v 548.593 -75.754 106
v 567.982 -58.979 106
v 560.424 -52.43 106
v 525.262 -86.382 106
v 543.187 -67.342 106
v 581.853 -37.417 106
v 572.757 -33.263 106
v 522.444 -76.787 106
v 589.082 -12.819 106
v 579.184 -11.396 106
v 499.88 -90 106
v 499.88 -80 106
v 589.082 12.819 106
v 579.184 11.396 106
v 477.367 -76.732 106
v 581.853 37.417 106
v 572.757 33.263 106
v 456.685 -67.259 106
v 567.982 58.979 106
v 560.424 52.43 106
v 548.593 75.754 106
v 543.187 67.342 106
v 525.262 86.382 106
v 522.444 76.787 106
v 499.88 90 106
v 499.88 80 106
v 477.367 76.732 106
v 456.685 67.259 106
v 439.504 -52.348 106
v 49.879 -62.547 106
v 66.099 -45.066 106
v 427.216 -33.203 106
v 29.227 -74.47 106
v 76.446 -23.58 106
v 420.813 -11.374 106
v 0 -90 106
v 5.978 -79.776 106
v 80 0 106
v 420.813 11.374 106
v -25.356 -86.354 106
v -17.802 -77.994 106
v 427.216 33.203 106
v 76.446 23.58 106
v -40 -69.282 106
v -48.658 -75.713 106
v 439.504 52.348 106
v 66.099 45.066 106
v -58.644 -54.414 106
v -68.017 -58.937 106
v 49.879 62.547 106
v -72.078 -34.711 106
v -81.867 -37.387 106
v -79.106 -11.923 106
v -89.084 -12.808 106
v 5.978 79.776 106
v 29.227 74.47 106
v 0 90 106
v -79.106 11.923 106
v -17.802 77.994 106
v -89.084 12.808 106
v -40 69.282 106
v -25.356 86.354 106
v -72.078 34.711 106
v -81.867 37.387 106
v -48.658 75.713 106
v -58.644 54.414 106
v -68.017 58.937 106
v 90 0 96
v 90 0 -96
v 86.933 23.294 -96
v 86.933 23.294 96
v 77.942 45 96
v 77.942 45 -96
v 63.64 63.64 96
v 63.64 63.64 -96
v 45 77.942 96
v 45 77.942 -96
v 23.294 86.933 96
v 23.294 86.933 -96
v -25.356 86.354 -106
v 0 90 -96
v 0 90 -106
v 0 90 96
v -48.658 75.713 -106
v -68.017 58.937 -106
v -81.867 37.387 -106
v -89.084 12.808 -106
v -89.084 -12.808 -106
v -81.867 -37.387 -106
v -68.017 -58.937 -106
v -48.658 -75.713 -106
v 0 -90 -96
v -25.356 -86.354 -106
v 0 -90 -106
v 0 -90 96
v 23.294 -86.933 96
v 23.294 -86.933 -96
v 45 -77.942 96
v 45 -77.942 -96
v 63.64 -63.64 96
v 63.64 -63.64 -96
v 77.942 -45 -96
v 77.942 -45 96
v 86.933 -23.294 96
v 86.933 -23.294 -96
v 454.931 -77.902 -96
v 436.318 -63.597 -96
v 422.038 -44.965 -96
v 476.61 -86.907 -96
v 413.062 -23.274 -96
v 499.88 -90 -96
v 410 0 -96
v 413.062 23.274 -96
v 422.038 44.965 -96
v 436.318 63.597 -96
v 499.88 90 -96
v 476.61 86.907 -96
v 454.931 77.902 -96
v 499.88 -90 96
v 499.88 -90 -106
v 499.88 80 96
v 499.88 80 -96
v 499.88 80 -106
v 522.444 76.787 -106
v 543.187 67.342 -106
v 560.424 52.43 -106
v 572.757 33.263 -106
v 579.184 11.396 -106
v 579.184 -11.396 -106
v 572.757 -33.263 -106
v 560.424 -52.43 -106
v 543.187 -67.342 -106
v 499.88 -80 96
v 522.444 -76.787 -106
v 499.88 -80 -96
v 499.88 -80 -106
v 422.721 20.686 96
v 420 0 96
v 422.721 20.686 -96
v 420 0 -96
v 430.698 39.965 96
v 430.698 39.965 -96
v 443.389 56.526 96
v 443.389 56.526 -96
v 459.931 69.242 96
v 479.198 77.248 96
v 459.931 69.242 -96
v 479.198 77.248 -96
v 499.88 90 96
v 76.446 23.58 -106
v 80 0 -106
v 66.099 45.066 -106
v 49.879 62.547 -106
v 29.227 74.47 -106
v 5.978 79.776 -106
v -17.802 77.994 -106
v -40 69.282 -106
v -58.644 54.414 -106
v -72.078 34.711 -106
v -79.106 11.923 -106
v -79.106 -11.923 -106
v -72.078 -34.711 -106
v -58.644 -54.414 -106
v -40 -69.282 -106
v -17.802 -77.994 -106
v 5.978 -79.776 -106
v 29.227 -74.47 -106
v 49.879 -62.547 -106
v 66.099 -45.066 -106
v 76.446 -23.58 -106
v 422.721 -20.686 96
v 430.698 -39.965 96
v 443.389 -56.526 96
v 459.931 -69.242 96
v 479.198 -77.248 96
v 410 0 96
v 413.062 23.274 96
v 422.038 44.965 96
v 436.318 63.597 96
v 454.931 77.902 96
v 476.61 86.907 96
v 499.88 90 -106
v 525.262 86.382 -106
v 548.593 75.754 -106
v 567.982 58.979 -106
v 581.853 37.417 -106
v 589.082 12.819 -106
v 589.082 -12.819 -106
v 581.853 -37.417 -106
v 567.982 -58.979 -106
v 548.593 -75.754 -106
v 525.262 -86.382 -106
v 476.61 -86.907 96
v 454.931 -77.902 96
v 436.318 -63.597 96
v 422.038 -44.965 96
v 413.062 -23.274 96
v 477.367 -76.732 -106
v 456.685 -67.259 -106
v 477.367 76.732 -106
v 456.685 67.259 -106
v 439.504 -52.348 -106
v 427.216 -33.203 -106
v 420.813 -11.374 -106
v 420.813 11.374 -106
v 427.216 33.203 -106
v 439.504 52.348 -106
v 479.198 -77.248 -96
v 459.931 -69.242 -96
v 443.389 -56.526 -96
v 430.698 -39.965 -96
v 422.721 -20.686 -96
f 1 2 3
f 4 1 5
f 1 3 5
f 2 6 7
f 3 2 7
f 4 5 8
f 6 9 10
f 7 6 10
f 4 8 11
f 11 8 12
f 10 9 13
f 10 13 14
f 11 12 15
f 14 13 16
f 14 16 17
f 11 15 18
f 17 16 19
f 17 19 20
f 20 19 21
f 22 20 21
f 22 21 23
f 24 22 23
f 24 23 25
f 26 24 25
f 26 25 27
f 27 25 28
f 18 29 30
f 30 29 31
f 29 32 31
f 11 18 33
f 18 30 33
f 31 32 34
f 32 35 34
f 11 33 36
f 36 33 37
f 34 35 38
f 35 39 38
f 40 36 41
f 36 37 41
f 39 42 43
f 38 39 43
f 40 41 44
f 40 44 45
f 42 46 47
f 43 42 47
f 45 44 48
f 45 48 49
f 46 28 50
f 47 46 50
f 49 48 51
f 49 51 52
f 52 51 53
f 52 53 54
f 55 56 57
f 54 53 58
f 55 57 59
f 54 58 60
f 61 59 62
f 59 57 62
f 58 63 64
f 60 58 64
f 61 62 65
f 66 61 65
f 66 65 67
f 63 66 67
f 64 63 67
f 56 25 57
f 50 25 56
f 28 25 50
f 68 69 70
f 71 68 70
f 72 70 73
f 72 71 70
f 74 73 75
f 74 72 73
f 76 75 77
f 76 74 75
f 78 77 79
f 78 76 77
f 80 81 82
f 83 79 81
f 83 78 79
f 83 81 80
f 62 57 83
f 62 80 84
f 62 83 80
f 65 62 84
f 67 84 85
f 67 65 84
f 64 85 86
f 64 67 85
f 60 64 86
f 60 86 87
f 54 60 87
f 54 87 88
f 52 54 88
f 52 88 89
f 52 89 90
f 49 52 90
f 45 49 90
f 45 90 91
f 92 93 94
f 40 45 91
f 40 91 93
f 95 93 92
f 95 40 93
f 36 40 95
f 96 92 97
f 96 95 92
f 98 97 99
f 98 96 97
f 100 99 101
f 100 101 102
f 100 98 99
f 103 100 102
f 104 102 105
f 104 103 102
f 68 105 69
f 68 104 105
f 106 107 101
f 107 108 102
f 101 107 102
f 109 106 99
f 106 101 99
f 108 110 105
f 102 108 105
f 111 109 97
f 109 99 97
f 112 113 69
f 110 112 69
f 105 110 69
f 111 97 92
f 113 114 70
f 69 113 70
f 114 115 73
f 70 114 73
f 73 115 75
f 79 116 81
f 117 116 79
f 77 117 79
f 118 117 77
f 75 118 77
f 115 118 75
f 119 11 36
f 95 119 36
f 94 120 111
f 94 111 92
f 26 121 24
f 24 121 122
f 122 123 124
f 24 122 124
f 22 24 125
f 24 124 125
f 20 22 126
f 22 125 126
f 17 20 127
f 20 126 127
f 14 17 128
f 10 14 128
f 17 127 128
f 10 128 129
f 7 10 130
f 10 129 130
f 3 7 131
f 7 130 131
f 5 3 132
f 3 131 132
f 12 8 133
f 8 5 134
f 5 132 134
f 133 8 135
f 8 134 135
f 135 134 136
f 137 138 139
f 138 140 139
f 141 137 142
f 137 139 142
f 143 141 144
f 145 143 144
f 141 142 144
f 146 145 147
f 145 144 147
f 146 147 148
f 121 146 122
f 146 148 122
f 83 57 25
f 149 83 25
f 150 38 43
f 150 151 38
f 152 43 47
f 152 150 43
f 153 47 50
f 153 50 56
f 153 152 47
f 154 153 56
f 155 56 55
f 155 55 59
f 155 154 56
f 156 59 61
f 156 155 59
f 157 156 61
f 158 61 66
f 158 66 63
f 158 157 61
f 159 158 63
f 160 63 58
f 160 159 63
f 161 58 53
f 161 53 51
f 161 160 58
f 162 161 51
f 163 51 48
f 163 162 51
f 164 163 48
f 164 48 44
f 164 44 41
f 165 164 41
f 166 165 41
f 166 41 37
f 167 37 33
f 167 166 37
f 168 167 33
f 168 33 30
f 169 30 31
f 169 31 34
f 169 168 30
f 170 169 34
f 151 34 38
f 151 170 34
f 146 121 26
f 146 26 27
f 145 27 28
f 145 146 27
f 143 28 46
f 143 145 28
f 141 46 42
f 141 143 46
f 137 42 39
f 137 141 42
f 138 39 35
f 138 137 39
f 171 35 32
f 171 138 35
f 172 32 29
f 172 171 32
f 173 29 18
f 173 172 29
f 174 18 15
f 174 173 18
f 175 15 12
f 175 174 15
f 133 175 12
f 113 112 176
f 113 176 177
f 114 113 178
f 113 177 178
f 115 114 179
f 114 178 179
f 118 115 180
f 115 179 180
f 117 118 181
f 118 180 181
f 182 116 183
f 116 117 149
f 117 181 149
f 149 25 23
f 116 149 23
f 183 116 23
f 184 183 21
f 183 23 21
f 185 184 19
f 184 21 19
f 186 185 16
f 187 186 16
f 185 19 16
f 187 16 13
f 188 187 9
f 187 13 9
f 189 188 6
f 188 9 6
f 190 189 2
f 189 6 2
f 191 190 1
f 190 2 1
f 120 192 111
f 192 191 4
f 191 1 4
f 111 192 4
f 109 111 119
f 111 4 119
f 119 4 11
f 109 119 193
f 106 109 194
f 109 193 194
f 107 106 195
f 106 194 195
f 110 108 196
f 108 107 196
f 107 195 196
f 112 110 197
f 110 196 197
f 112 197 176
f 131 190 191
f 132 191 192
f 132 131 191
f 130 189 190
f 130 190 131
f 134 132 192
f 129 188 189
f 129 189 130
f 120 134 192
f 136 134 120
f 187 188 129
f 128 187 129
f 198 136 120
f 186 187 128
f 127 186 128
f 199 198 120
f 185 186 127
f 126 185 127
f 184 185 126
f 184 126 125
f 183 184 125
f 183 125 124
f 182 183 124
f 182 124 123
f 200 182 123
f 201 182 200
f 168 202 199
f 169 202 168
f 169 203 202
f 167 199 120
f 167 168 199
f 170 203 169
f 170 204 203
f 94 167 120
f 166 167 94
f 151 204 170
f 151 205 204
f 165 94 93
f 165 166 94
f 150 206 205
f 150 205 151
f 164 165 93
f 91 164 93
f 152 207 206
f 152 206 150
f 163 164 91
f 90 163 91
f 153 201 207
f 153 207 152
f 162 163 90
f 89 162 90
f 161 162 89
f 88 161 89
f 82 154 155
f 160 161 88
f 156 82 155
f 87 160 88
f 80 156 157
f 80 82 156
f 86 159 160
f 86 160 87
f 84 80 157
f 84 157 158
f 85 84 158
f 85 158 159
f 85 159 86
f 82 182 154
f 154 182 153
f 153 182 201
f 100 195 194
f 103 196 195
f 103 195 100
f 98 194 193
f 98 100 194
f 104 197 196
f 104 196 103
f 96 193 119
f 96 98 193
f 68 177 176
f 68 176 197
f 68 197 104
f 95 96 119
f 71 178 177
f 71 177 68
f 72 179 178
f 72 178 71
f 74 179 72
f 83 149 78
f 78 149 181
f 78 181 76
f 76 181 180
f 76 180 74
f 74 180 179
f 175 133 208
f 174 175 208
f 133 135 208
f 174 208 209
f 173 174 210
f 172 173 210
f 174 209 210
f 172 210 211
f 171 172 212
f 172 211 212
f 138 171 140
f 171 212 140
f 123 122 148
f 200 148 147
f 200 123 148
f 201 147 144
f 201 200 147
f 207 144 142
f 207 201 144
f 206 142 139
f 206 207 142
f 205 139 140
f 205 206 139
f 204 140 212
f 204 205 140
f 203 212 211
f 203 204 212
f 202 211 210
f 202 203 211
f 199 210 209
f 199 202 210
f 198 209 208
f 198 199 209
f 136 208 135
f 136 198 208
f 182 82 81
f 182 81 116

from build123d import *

# Parameters (mm, degrees)
SKETCH1_R               = 90
SKETCH1_R_2             = 80
BOSS_EXTRUDE1_DEPTH     = 106
BOSS_EXTRUDE2_DEPTH     = 10
CUT_EXTRUDE1_DEPTH      = 631.082534276
CUT_EXTRUDE1_DEPTH_BACK = 631.082534276


with BuildPart() as part:
    # Sketch1 → Boss-Extrude1 (new, symmetric)
    with BuildSketch(Plane.XY):
        Circle(SKETCH1_R)
        Circle(SKETCH1_R_2, mode=Mode.SUBTRACT)
    boss_extrude1 = extrude(amount=BOSS_EXTRUDE1_DEPTH, both=True)

    # Sketch2 → Boss-Extrude2 (add)
    with BuildSketch(Plane.XY.offset(106)):
        with BuildLine():
            Line((0, 90), (499.88, 90))
            Line((499.88, 90), (499.88, -90))
            Line((499.88, -90), (0, -90))
            ThreePointArc((0, -90), (90, 0), (0, 90))
        make_face()
    boss_extrude2 = extrude(amount=-BOSS_EXTRUDE2_DEPTH)

    # Mirror1: Boss-Extrude2 across plane
    add(boss_extrude2.mirror(Plane.XY))

    # Mirror2: Boss-Extrude1 across plane
    add(boss_extrude1.mirror(Plane(origin=(250, 0, 0), x_dir=(0, 0, 1), z_dir=(1, 0, 0))))

    # Sketch3 → Cut-Extrude1 (cut, two sides: drawn at the far end of the back side and taken through both)
    with BuildSketch(Plane.XY.offset(-96).offset(-CUT_EXTRUDE1_DEPTH_BACK)):
        with BuildLine():
            Line((499.88, -79.99991), (499.88, 79.99991))
            ThreePointArc((499.88, 79.99991), (420, 0), (499.88, -79.99991))
        make_face()
    extrude(amount=CUT_EXTRUDE1_DEPTH + CUT_EXTRUDE1_DEPTH_BACK, mode=Mode.SUBTRACT)


solid = part.part
